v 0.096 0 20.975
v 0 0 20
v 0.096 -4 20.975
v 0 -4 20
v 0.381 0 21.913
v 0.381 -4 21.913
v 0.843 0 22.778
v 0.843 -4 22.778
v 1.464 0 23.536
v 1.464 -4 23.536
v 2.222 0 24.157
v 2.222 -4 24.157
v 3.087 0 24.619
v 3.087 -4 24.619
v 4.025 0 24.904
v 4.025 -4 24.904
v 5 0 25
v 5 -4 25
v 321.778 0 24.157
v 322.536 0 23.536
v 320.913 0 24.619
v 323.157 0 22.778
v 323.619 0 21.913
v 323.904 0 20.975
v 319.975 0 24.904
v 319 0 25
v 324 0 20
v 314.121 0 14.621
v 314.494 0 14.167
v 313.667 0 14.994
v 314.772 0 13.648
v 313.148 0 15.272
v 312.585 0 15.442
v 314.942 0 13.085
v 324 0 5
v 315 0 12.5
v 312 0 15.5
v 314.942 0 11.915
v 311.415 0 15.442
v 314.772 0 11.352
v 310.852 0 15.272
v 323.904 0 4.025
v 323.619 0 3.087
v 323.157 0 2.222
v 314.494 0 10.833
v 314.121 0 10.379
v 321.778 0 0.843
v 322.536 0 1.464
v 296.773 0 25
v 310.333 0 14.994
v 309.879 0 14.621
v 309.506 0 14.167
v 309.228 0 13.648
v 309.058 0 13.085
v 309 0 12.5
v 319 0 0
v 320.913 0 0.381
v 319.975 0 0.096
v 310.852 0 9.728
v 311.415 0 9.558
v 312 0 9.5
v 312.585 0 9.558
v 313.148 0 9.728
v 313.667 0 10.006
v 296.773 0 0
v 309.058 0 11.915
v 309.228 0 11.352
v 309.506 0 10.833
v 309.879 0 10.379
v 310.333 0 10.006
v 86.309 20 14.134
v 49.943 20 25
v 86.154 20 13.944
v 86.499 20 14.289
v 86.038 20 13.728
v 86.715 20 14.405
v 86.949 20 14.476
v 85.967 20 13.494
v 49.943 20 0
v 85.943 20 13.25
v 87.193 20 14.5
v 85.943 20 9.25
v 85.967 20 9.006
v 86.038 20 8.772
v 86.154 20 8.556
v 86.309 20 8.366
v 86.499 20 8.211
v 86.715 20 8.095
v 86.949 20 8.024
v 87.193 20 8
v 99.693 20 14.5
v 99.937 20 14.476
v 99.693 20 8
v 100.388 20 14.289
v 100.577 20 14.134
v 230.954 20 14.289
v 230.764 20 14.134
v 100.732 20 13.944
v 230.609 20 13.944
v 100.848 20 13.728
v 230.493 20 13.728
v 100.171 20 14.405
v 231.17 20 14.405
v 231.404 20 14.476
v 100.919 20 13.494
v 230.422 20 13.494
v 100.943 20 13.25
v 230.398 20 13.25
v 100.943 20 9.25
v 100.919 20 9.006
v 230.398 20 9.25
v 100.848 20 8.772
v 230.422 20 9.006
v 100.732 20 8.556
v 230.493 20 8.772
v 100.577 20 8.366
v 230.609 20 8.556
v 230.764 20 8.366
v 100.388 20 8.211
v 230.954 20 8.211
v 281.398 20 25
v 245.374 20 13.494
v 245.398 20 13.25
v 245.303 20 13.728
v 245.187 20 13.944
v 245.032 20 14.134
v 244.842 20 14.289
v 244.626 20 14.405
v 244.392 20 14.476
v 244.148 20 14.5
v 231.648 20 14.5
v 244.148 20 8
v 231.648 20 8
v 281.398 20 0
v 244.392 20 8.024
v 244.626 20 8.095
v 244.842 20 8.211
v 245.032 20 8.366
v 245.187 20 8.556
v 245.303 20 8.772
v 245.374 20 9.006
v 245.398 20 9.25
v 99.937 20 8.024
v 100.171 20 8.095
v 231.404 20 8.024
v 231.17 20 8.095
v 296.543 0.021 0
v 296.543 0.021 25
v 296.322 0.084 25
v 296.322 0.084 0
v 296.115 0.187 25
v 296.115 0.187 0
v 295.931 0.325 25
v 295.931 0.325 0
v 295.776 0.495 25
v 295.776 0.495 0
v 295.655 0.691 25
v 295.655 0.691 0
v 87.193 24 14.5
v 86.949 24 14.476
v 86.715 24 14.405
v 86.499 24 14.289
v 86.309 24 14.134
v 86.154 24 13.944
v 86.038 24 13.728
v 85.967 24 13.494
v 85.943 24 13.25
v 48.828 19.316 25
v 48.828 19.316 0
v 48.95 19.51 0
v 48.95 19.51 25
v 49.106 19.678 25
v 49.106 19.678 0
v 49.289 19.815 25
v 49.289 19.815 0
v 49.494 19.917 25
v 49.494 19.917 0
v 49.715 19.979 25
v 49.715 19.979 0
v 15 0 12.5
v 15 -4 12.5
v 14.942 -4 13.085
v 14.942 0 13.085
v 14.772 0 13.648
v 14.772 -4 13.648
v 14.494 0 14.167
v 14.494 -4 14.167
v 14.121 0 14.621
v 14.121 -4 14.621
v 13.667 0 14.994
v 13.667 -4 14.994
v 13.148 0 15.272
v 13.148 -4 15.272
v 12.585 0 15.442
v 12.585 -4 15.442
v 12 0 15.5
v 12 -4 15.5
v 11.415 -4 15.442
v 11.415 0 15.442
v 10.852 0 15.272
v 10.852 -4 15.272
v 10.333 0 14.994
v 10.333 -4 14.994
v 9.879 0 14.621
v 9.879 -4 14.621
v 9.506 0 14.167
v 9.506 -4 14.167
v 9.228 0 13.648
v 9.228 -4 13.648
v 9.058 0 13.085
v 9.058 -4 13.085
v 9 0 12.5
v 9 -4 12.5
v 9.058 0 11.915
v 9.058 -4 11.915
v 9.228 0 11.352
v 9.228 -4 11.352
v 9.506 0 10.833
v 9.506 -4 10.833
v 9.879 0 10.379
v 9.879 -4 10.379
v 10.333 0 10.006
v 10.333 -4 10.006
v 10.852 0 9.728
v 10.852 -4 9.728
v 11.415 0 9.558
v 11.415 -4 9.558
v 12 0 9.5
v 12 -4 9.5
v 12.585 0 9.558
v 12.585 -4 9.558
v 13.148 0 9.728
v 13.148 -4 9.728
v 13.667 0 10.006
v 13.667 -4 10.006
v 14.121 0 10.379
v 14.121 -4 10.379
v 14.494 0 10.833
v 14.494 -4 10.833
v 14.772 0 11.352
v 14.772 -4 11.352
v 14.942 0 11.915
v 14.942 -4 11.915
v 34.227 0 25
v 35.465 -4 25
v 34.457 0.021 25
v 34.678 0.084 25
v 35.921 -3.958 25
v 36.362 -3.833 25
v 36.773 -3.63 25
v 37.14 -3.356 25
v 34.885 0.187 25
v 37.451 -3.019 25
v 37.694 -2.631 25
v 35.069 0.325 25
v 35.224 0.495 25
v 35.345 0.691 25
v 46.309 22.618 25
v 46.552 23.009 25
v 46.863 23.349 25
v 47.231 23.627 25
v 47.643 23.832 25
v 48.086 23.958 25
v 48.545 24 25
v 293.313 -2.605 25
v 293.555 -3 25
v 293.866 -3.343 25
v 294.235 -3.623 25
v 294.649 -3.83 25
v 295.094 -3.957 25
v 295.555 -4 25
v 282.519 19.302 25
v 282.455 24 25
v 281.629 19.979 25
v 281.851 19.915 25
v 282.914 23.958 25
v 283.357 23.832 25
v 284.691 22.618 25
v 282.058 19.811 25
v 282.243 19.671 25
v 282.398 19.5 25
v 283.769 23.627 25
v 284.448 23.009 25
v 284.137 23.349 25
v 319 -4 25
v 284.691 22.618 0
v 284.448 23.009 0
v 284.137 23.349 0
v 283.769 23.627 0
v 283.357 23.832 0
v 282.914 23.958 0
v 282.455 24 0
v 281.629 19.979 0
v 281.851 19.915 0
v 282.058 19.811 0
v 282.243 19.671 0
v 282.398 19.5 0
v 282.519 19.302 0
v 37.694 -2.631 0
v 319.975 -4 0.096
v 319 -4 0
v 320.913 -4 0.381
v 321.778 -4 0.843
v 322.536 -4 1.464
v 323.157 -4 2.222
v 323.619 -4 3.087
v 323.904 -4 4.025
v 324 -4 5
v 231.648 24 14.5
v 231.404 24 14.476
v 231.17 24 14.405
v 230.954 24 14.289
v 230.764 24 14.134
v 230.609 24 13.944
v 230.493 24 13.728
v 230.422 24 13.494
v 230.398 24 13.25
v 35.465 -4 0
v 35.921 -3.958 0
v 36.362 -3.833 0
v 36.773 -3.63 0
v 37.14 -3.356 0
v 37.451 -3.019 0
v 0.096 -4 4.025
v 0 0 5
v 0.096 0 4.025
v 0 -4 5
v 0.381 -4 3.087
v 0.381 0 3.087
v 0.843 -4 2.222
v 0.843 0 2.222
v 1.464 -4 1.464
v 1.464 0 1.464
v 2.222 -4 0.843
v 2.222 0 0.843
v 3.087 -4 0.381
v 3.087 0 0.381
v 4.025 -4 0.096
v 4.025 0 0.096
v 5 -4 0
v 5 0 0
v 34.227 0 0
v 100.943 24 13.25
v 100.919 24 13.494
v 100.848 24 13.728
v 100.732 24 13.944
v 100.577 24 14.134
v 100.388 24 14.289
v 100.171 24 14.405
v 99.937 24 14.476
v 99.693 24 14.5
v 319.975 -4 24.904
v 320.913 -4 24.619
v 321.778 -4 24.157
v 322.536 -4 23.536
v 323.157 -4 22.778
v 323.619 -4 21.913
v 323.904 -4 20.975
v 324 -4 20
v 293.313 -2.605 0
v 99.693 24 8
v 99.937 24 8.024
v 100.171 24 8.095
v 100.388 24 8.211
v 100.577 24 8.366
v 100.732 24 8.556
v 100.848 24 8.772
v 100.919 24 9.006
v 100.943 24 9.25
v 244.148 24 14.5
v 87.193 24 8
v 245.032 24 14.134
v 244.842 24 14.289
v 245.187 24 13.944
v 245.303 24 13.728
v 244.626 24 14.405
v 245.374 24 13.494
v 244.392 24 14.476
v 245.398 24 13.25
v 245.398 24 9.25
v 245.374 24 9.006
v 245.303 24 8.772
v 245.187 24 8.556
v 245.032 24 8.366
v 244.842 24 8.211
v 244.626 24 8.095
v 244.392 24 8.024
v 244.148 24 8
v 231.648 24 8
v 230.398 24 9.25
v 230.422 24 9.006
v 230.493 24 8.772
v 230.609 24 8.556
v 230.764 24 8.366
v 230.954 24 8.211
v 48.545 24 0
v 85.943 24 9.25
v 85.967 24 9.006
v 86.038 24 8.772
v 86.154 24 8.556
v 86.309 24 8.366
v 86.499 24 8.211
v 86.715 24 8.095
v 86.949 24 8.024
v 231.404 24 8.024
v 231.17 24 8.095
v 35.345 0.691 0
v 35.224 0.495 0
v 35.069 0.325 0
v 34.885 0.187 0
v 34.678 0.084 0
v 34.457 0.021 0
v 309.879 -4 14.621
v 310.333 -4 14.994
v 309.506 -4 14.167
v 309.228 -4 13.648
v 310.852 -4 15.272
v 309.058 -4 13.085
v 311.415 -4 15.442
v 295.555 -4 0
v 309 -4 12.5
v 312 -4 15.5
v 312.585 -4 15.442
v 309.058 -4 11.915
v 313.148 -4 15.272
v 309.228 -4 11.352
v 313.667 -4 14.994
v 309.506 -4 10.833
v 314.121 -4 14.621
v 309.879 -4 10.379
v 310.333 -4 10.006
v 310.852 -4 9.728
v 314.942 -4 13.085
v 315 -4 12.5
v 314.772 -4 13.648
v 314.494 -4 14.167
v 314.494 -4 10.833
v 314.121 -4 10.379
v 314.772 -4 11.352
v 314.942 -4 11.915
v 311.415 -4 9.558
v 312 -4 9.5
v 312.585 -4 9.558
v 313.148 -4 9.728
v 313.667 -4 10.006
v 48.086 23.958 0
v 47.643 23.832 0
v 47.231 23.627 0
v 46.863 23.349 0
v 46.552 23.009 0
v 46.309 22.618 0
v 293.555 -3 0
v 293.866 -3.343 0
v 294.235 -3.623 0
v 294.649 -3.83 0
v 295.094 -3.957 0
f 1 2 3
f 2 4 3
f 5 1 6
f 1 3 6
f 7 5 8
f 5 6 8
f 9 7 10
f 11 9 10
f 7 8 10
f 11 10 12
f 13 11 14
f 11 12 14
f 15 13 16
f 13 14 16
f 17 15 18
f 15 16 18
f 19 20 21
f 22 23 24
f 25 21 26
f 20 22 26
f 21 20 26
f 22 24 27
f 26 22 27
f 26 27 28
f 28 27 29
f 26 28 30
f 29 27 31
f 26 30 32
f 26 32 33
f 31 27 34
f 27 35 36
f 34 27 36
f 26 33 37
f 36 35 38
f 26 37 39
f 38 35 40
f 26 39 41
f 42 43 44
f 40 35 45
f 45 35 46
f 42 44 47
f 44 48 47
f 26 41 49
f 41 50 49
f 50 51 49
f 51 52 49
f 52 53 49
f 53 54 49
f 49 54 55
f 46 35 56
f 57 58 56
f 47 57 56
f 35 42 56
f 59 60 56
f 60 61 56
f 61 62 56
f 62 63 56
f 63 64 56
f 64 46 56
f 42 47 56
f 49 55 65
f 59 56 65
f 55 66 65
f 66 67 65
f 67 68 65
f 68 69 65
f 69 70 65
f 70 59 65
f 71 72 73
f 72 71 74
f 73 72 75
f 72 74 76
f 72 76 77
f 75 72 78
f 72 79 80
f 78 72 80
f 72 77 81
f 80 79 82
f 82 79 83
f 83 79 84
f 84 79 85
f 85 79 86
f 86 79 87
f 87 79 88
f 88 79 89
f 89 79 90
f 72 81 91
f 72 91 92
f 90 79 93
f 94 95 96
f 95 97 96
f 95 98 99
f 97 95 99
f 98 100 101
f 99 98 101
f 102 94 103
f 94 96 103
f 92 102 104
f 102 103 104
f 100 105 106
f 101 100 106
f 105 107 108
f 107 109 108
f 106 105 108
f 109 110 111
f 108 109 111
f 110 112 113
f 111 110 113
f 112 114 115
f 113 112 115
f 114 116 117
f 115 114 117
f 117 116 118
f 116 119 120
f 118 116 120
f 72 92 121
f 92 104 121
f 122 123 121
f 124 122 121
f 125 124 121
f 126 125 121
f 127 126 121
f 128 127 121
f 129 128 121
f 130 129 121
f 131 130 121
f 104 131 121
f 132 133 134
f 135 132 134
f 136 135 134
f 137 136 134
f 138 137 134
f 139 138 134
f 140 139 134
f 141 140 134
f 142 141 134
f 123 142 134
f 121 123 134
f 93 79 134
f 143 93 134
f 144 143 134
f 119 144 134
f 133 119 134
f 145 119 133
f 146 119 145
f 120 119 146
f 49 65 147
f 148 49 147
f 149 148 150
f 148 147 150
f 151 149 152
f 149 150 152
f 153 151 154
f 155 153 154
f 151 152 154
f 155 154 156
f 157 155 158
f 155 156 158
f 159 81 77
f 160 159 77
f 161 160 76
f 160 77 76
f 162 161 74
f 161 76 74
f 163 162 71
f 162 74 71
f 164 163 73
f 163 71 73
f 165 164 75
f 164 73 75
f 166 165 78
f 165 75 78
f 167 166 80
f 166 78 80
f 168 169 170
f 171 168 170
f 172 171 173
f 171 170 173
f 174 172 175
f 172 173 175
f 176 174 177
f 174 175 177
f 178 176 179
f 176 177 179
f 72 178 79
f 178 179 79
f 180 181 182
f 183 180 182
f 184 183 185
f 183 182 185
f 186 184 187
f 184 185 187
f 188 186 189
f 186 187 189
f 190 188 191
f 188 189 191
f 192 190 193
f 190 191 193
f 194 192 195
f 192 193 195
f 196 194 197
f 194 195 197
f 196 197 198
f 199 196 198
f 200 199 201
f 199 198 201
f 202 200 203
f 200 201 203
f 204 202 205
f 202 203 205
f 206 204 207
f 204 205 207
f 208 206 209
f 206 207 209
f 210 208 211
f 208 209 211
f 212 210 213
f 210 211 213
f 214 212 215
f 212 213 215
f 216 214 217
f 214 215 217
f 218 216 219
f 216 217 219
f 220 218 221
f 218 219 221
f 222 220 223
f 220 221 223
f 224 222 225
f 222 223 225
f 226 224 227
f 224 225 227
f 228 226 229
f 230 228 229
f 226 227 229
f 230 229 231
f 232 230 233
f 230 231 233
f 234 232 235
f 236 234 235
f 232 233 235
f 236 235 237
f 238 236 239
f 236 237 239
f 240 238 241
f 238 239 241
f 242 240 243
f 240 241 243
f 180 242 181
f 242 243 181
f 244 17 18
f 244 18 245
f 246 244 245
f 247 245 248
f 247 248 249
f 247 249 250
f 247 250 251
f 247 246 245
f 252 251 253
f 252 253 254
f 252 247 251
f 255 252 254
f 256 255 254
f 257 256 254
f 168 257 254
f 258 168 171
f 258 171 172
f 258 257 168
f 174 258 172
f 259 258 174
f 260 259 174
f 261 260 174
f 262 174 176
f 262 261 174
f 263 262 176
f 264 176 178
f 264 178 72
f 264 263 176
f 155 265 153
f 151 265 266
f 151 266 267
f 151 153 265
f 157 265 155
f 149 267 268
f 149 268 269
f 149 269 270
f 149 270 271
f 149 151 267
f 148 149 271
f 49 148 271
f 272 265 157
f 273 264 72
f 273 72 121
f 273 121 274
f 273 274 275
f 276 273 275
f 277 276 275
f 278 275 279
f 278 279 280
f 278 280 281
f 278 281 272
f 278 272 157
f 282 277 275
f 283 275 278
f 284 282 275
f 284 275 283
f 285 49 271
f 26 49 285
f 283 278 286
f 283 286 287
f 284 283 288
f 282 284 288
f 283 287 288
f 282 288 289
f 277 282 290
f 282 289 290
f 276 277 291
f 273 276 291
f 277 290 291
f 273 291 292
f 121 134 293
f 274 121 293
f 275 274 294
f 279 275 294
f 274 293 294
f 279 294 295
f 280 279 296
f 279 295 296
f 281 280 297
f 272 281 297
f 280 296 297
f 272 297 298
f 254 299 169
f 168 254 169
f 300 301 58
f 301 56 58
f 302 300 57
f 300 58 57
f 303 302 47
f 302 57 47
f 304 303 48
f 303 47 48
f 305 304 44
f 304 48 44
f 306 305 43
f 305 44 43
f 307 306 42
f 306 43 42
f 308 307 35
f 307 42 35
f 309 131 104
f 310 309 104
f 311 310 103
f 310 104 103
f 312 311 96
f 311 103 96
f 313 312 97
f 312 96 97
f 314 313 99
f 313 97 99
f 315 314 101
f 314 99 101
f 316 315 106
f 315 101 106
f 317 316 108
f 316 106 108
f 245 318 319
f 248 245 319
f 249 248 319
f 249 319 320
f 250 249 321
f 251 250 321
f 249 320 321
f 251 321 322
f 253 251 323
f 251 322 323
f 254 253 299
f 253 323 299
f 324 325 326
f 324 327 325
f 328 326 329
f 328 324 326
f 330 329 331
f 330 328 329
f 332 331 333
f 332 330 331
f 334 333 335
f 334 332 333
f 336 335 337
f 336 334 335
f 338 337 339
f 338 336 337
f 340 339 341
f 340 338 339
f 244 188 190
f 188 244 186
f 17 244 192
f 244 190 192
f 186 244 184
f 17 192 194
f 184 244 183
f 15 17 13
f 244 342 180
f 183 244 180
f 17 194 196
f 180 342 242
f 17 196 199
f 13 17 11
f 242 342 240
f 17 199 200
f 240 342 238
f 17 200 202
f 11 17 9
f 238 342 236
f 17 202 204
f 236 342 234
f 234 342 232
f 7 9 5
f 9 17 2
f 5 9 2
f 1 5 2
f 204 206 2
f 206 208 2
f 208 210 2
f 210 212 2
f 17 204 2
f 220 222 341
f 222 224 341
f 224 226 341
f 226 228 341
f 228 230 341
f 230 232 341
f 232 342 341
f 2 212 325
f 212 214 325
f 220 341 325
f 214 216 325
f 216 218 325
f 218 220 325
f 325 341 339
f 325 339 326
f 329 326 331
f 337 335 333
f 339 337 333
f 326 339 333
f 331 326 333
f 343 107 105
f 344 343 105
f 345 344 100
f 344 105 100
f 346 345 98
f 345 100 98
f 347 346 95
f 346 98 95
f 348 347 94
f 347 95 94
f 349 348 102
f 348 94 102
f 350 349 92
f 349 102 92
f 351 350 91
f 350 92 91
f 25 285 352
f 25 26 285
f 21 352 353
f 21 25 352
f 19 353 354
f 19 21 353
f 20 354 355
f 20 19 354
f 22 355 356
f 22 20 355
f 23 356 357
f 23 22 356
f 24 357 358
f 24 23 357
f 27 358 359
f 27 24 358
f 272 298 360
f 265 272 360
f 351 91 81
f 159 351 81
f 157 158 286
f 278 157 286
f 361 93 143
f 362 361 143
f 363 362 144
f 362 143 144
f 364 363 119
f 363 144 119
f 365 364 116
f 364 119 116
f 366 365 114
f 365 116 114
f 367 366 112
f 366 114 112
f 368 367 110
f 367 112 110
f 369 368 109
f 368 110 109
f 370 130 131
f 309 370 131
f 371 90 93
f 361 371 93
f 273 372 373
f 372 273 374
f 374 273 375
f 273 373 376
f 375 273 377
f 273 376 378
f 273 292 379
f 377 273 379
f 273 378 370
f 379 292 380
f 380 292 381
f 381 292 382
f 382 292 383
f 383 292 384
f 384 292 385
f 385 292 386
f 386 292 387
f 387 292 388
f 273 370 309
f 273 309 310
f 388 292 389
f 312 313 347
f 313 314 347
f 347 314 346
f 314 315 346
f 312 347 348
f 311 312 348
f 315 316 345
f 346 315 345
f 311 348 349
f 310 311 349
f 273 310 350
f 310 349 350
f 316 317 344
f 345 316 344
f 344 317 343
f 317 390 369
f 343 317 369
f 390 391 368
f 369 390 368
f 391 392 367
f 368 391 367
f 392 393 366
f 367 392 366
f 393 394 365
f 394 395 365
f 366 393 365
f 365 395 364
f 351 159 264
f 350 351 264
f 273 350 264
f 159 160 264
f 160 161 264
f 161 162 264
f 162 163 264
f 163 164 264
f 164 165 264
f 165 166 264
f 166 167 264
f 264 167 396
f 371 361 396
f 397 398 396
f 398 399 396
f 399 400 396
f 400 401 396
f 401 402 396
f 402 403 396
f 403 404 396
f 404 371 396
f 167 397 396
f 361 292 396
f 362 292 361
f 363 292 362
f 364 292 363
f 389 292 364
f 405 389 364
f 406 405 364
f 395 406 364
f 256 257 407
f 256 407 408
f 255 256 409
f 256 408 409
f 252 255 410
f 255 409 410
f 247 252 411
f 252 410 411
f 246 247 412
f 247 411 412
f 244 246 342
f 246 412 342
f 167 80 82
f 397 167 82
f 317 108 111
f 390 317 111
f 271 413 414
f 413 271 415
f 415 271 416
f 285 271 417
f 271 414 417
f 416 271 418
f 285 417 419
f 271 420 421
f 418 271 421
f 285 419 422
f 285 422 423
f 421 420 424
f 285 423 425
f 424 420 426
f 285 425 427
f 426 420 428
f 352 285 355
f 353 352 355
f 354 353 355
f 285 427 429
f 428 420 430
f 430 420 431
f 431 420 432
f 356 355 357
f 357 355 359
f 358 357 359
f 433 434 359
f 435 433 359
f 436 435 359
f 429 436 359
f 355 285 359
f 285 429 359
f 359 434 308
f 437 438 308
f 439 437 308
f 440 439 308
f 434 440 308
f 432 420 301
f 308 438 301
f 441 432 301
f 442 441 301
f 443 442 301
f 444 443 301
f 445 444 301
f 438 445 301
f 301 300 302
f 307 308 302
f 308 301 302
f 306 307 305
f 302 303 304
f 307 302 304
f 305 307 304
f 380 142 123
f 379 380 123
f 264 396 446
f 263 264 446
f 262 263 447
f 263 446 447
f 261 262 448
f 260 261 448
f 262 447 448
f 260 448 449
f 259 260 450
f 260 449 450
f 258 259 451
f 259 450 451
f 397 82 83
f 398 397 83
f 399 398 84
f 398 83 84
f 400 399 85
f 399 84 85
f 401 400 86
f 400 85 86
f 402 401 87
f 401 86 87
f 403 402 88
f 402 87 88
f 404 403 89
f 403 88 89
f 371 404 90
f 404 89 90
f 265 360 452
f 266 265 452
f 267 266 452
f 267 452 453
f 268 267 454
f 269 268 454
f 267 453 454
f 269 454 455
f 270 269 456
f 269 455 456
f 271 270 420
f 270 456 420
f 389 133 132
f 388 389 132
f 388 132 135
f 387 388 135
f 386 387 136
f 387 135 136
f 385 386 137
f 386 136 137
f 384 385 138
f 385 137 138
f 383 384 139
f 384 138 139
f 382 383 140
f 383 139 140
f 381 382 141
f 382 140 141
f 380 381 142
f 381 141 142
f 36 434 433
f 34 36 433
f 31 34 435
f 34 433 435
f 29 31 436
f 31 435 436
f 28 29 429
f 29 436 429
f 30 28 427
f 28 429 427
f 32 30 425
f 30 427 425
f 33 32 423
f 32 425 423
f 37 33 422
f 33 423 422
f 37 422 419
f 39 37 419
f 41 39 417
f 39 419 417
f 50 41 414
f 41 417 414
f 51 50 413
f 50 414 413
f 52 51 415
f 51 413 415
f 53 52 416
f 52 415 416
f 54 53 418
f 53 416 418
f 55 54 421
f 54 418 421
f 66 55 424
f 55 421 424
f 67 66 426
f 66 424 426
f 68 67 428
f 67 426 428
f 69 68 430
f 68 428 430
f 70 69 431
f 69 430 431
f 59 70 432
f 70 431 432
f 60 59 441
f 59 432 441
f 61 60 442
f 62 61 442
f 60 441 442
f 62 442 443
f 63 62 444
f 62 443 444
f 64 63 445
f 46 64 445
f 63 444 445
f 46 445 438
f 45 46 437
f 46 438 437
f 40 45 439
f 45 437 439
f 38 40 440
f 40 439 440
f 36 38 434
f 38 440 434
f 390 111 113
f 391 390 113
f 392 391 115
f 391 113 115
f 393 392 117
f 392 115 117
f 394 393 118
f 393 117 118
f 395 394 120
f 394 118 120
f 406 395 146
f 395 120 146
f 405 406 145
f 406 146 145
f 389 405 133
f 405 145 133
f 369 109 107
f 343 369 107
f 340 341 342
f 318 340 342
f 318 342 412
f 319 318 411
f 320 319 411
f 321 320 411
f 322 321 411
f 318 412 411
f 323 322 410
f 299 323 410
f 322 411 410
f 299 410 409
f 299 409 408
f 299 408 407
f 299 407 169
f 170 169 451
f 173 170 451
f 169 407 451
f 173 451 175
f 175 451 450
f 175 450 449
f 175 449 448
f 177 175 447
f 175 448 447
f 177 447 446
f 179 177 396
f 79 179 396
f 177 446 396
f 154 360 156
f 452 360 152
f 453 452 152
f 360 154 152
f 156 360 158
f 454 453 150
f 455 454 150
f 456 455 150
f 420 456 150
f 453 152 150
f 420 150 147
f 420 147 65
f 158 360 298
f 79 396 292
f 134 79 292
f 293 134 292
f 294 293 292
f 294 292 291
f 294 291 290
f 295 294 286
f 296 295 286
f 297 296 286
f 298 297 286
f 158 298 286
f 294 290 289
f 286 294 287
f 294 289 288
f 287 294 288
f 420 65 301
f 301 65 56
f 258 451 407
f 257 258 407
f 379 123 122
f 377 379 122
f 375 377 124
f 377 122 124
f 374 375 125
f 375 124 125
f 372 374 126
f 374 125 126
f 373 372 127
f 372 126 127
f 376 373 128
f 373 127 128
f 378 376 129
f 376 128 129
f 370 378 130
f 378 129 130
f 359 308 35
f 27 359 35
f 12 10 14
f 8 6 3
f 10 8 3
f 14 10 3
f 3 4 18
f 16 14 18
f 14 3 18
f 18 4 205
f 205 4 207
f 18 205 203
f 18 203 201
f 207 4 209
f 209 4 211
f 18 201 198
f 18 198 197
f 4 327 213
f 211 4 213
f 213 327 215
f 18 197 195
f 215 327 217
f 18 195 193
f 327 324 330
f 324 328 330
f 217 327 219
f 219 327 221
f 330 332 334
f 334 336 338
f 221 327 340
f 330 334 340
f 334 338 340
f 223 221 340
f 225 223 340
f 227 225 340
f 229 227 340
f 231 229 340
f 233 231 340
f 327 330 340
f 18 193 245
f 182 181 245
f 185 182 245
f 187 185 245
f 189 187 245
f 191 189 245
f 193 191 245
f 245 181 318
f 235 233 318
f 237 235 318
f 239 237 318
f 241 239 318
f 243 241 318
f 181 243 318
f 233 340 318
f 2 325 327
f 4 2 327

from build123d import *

# Parameters (mm, degrees)
F1_DEPTH = 25
F3_DEPTH = 4
F4_R     = 5
F5_R     = 3
F6_DEPTH = 4
F7_R     = 3
F8_DEPTH = 4


with BuildPart() as f1:
    # F0 (on Top) → F1 (new body)
    with BuildSketch(Plane.XY):
        with BuildLine():
            Line((34.227458, 0), (0, 0))
            Line((0, 0), (0, -4))
            Line((0, -4), (35.464979, -4))
            ThreePointArc((35.464979, -4), (36.773095, -3.630453), (37.694484, -2.631065))
            Line((37.694484, -2.631065), (48.828359, 19.315533))
            ThreePointArc((48.828359, 19.315533), (49.289053, 19.815227), (49.943111, 20))
            Line((49.943111, 20), (281.397978, 20))
            ThreePointArc((281.397978, 20), (282.05826, 19.81138), (282.519275, 19.302444))
            Line((282.519275, 19.302444), (293.312652, -2.604888))
            ThreePointArc((293.312652, -2.604888), (294.23468, -3.62276), (295.555244, -4))
            Line((295.555244, -4), (324, -4))
            Line((324, -4), (324, 0))
            Line((324, 0), (296.772542, 0))
            ThreePointArc((296.772542, 0), (296.115379, 0.186686), (295.654508, 0.690983))
            Line((295.654508, 0.690983), (284.690983, 22.618034))
            ThreePointArc((284.690983, 22.618034), (283.769243, 23.626627), (282.454915, 24))
            Line((282.454915, 24), (48.545085, 24))
            ThreePointArc((48.545085, 24), (47.230757, 23.626627), (46.309017, 22.618034))
            Line((46.309017, 22.618034), (35.345492, 0.690983))
            ThreePointArc((35.345492, 0.690983), (34.884621, 0.186686), (34.227458, 0))
        make_face()
    extrude(amount=F1_DEPTH)

    # F2 (on face) → F3 (cut)
    with BuildSketch(Plane.XZ.offset(-20)):
        with BuildLine():
            Line((99.693111, 14.5), (87.193111, 14.5))
            ThreePointArc((87.193111, 14.5), (86.309228, 14.133883), (85.943111, 13.25))
            Line((85.943111, 13.25), (85.943111, 9.25))
            ThreePointArc((85.943111, 9.25), (86.309228, 8.366117), (87.193111, 8))
            Line((87.193111, 8), (99.693111, 8))
            ThreePointArc((99.693111, 8), (100.576995, 8.366117), (100.943111, 9.25))
            Line((100.943111, 9.25), (100.943111, 13.25))
            ThreePointArc((100.943111, 13.25), (100.576995, 14.133883), (99.693111, 14.5))
        make_face()
        with BuildLine():
            Line((244.147978, 14.5), (231.647978, 14.5))
            ThreePointArc((231.647978, 14.5), (230.764095, 14.133883), (230.397978, 13.25))
            Line((230.397978, 13.25), (230.397978, 9.25))
            ThreePointArc((230.397978, 9.25), (230.764095, 8.366117), (231.647978, 8))
            Line((231.647978, 8), (244.147978, 8))
            ThreePointArc((244.147978, 8), (245.031862, 8.366117), (245.397978, 9.25))
            Line((245.397978, 9.25), (245.397978, 13.25))
            ThreePointArc((245.397978, 13.25), (245.031862, 14.133883), (244.147978, 14.5))
        make_face()
    extrude(amount=-F3_DEPTH, mode=Mode.SUBTRACT)

    # F4
    f4_edges = [f1.edges().sort_by_distance(p)[0] for p in [
        (324, -2, 25),
        (324, -2, 0),
        (0, -2, 25),
        (0, -2, 0),
    ]]
    fillet(f4_edges, radius=F4_R)

    # F5 (on face) → F6 (cut)
    with BuildSketch(Plane.XZ.offset(4)):
        with Locations((12, 12.5)):
            Circle(F5_R)
    extrude(amount=-F6_DEPTH, mode=Mode.SUBTRACT)

    # F7 (on face) → F8 (cut)
    with BuildSketch(Plane.XZ.offset(4)):
        with Locations((312, 12.5)):
            Circle(F7_R)
    extrude(amount=-F8_DEPTH, mode=Mode.SUBTRACT)


solid = f1.part
